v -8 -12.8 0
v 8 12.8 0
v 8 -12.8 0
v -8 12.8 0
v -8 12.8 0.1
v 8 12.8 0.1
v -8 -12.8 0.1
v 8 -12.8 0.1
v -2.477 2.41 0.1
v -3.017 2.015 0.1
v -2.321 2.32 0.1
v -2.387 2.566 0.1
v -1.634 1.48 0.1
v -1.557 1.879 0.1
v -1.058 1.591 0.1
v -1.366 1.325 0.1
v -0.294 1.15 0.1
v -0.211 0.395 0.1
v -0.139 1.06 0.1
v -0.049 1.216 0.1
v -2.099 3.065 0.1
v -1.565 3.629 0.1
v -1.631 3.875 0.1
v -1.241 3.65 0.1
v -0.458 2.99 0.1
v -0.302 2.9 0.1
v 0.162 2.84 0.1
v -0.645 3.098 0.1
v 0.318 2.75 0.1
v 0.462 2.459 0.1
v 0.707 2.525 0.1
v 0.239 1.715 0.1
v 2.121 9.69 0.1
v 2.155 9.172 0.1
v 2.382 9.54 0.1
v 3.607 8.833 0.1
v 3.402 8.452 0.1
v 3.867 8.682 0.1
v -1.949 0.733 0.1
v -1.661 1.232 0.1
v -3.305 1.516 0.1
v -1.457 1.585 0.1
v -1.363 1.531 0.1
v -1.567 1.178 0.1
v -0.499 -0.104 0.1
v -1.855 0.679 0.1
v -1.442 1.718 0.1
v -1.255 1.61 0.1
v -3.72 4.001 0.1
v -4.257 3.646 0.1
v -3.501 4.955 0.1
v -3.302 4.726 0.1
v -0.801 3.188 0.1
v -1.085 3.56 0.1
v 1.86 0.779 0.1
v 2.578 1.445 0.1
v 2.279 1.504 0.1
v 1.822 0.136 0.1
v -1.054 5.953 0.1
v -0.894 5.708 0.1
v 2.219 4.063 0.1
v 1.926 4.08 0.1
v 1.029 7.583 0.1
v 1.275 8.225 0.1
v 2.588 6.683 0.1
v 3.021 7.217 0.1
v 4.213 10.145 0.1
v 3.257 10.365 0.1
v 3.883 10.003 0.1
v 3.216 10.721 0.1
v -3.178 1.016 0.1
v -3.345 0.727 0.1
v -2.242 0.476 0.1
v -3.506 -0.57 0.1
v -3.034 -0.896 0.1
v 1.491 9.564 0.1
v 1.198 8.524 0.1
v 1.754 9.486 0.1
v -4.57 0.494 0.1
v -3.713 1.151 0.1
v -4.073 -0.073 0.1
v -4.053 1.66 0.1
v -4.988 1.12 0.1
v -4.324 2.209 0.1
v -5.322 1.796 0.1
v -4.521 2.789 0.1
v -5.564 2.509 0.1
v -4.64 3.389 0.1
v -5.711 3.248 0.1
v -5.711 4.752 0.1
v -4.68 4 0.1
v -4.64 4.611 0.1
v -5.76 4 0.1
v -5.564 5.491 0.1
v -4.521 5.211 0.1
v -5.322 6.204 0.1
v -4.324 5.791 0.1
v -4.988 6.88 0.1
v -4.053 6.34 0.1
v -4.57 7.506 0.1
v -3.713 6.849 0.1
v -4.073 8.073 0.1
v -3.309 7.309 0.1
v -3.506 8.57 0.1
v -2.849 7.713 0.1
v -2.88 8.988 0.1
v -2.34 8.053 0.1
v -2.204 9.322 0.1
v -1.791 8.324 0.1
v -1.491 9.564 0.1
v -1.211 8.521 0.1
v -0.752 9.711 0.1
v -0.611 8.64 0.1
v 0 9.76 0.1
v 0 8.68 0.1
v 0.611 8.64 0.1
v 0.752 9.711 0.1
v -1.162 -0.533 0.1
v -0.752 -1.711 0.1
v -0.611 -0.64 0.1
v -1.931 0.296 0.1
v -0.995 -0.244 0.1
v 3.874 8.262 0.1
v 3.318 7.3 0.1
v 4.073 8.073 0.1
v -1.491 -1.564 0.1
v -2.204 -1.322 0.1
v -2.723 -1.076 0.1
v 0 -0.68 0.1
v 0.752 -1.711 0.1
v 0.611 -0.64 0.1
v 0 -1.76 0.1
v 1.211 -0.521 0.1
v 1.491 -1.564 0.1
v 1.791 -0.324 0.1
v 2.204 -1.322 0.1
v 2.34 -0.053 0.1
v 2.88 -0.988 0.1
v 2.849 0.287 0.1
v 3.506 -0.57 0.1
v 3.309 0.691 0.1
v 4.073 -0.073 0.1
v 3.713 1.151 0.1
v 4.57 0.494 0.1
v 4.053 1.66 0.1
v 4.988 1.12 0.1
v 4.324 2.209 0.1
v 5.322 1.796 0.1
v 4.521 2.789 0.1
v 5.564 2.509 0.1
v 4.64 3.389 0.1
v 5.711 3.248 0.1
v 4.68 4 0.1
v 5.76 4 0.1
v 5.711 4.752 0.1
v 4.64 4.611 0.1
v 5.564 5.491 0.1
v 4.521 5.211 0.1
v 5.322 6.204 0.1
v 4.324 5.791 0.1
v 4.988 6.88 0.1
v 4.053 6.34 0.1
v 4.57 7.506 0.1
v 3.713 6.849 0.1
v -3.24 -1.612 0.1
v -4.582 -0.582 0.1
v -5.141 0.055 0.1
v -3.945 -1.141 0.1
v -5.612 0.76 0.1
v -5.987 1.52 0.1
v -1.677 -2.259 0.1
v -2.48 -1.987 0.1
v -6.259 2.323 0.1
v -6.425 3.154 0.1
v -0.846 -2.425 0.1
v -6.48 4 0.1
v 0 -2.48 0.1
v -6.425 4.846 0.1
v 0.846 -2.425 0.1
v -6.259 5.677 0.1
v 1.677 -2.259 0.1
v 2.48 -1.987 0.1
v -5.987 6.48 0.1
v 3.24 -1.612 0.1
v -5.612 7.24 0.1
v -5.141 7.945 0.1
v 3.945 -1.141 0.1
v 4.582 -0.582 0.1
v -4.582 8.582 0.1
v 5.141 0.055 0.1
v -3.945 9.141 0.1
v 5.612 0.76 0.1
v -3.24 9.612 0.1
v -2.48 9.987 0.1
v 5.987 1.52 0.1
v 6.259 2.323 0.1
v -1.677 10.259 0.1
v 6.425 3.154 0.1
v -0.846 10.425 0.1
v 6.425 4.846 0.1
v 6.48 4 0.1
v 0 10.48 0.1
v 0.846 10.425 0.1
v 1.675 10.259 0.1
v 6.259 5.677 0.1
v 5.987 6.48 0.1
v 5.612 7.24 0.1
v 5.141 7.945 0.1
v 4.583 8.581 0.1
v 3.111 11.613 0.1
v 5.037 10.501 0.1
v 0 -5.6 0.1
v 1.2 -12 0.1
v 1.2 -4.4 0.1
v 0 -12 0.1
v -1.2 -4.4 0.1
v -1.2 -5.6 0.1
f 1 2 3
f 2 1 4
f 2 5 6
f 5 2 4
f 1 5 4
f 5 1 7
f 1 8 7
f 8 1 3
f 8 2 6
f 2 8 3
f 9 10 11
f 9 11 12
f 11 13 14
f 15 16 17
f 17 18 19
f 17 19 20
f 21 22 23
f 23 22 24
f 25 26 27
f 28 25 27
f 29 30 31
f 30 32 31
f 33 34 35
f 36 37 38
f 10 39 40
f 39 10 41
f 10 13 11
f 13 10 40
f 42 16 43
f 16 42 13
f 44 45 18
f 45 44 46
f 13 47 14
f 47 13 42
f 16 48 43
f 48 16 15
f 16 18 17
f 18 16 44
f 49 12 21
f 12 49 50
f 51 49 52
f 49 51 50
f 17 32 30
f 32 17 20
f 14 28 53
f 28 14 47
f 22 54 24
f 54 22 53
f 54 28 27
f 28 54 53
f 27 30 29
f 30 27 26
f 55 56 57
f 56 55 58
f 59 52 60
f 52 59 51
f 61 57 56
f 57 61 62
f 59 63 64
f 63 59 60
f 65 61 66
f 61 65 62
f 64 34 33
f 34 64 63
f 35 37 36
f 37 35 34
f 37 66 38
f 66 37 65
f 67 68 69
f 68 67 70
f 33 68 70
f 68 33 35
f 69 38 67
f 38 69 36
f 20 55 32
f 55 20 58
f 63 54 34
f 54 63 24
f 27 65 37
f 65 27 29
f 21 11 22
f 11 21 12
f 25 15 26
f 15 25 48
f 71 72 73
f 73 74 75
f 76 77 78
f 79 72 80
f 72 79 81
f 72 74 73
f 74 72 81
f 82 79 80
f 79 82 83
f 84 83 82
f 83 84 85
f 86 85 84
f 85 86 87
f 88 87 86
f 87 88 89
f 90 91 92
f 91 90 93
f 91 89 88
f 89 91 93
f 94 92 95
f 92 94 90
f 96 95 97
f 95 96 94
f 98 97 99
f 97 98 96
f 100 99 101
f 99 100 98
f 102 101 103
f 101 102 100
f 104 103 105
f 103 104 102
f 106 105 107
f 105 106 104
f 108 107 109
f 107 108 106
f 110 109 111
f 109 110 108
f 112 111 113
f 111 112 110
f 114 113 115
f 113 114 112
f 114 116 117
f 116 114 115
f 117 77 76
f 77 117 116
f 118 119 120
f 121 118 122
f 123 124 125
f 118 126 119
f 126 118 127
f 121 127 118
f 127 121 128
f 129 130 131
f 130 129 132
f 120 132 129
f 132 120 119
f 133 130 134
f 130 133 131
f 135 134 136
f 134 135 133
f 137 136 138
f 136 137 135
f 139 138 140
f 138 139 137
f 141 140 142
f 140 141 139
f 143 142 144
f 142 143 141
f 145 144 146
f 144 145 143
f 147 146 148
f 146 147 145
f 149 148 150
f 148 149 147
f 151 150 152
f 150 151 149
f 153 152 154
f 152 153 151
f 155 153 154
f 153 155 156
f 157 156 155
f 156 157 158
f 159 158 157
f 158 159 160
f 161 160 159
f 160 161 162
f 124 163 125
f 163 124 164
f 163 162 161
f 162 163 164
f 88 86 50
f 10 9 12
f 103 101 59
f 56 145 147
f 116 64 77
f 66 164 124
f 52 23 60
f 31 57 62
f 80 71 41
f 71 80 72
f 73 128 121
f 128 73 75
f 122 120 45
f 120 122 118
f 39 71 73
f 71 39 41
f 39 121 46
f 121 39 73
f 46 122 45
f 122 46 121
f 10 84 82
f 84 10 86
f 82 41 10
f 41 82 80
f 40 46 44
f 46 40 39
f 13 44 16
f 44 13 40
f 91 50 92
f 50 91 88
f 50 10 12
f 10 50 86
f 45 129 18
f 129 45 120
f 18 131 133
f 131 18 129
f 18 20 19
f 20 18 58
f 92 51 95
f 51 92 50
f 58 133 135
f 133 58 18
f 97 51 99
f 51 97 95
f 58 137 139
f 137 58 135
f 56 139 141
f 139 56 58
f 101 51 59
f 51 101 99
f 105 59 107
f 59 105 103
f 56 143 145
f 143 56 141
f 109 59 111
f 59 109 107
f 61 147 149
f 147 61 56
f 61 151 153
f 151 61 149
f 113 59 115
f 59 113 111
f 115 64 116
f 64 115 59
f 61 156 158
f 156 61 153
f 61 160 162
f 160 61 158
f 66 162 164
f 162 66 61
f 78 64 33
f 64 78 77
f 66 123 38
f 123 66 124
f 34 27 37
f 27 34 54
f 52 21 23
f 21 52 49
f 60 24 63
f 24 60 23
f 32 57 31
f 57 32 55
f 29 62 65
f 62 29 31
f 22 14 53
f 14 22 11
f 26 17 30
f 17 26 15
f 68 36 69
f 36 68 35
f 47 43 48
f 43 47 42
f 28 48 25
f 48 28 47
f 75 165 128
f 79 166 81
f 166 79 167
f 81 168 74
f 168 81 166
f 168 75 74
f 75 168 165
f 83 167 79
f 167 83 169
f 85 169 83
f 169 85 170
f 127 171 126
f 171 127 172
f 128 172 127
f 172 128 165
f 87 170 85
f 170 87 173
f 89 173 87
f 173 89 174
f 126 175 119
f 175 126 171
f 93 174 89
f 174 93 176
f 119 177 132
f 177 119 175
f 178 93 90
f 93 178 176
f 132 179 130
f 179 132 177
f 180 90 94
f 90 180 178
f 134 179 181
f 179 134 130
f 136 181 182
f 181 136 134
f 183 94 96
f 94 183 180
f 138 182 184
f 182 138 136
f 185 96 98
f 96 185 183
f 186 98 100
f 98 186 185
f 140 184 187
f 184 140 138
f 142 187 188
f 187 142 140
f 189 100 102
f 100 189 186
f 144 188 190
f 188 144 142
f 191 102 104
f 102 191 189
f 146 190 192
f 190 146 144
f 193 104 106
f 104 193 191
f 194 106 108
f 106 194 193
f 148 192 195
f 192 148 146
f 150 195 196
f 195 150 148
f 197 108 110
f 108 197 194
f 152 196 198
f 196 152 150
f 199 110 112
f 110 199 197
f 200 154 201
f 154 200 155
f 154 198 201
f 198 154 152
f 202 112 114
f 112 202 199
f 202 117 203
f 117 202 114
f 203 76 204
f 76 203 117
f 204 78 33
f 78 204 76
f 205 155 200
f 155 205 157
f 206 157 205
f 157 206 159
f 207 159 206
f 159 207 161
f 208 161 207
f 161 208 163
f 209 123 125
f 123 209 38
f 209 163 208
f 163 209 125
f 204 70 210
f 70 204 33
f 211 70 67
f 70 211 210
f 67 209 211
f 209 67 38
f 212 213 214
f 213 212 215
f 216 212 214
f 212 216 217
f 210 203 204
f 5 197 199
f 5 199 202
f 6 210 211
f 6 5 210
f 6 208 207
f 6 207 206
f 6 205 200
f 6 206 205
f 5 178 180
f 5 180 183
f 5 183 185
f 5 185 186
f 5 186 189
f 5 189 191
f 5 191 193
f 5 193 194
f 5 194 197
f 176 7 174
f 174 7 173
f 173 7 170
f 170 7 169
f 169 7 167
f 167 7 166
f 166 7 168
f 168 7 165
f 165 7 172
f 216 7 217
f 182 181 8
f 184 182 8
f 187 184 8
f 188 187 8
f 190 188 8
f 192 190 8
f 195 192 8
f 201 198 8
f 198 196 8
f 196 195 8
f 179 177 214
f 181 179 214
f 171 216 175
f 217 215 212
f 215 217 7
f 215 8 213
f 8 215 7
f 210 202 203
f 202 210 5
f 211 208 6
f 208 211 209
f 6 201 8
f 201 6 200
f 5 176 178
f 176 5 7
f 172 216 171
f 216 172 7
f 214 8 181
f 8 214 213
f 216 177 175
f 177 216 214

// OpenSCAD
// file: ../p/logo-launchcommand-bg.scad
use <../lib.scad>
function ldraw_lib__logo_launchcommand_bg() = [
// 0 Launch Command Logo Background (without Border)
// 0 Name: logo-launchcommand-bg.dat
// 0 Author: Chris Böhnke [KnightOfTarenta]
// 0 !LDRAW_ORG Primitive UPDATE 2025-05
// 0 !LICENSE Licensed under CC BY 4.0 : see CAreadme.txt
// 
// 0 !HELP Dimensions X = 32; Z = 34.67
// 
// 0 BFC CERTIFY CCW
  [0,"BFC","CERTIFY"],
  [0,"BFC","CCW"],
// 
// 0 !HISTORY 2025-04-27 [OrionP] Official Update 2025-04
// 0 !HISTORY 2025-05-24 [Holly-Wood] Updated description
// 0 !HISTORY 2025-05-28 [OrionP] Official Update 2025-05
// 
// 0 // Colour 16 Main Colour
// 3 16 -12.889 0 -1.697 -12.557 0 -3.365 -11.826 0 -.984
  [3,16,-12.889,0,-1.697,-12.557,0,-3.365,-11.826,0,-.984],
// 3 16 -8.38 0 -5.514 -6.88 0 -4.417 -6.63 0 -3.984
  [3,16,-8.38,0,-5.514,-6.88,0,-4.417,-6.63,0,-3.984],
// 3 16 -9.192 0 9.192 -10.314 0 7.914 -2.929 0 5.426
  [3,16,-9.192,0,9.192,-10.314,0,7.914,-2.929,0,5.426],
// 3 16 7.161 0 -7.097 11.258 0 -6.5 12.01 0 -4.975
  [3,16,7.161,0,-7.097,11.258,0,-6.5,12.01,0,-4.975],
// 3 16 1.697 0 12.889 3.542 0 11.736 3.329 0 12.566
  [3,16,1.697,0,12.889,3.542,0,11.736,3.329,0,12.566],
// 3 16 8.392 0 8.936 10.314 0 7.914 9.218 0 9.166
  [3,16,8.392,0,8.936,10.314,0,7.914,9.218,0,9.166],
// 3 16 -9.171 0 2.016 -4.53 0 -.347 -2.483 0 4.744
  [3,16,-9.171,0,2.016,-4.53,0,-.347,-2.483,0,4.744],
// 3 16 1.965 0 -4.097 6.331 0 -6.934 5.35 0 .222
  [3,16,1.965,0,-4.097,6.331,0,-6.934,5.35,0,.222],
// 4 16 -9.18 0 -6.9 -10.314 0 -7.914 -9.291 0 -9.093 -8.827 0 -8.289
  [4,16,-9.18,0,-6.9,-10.314,0,-7.914,-9.291,0,-9.093,-8.827,0,-8.289],
// 4 16 -7.563 0 -14.1 -5.363 0 -10.289 -6.229 0 -9.789 -8.429 0 -13.6
  [4,16,-7.563,0,-14.1,-5.363,0,-10.289,-6.229,0,-9.789,-8.429,0,-13.6],
// 4 16 -1.386 0 -11.4 -2.765 0 -11.789 -3.229 0 -12.593 -1.697 0 -12.889
  [4,16,-1.386,0,-11.4,-2.765,0,-11.789,-3.229,0,-12.593,-1.697,0,-12.889],
// 4 16 -9.18 0 -6.9 -8.827 0 -8.289 -6.229 0 -9.789 -5.413 0 -9.075
  [4,16,-9.18,0,-6.9,-8.827,0,-8.289,-6.229,0,-9.789,-5.413,0,-9.075],
// 4 16 -5.413 0 -9.075 -6.229 0 -9.789 -5.363 0 -10.289 -5.153 0 -9.225
  [4,16,-5.413,0,-9.075,-6.229,0,-9.789,-5.363,0,-10.289,-5.153,0,-9.225],
// 4 16 -1.386 0 -11.4 -5.153 0 -9.225 -5.363 0 -10.289 -2.765 0 -11.789
  [4,16,-1.386,0,-11.4,-5.153,0,-9.225,-5.363,0,-10.289,-2.765,0,-11.789],
// 4 16 -12.557 0 -3.365 -12.01 0 -4.975 -11.258 0 -6.5 -8.38 0 -5.514
  [4,16,-12.557,0,-3.365,-12.01,0,-4.975,-11.258,0,-6.5,-8.38,0,-5.514],
// 4 16 -10.314 0 -7.914 -9.18 0 -6.9 -8.38 0 -5.514 -11.258 0 -6.5
  [4,16,-10.314,0,-7.914,-9.18,0,-6.9,-8.38,0,-5.514,-11.258,0,-6.5],
// 4 16 -4.613 0 -7.689 -5.413 0 -9.075 -5.153 0 -9.225 -4.353 0 -7.839
  [4,16,-4.613,0,-7.689,-5.413,0,-9.075,-5.153,0,-9.225,-4.353,0,-7.839],
// 4 16 -3.794 0 -7.431 -4.538 0 -7.001 -4.613 0 -7.689 -4.353 0 -7.839
  [4,16,-3.794,0,-7.431,-4.538,0,-7.001,-4.613,0,-7.689,-4.353,0,-7.839],
// 4 16 -12.889 0 -1.697 -11.826 0 -.984 -12.889 0 1.697 -13 0 0
  [4,16,-12.889,0,-1.697,-11.826,0,-.984,-12.889,0,1.697,-13,0,0],
// 4 16 -12.557 0 -3.365 -8.38 0 -5.514 -6.63 0 -3.984 -11.826 0 -.984
  [4,16,-12.557,0,-3.365,-8.38,0,-5.514,-6.63,0,-3.984,-11.826,0,-.984],
// 4 16 -1.697 0 -12.889 0 0 -13 -.586 0 -10.014 -1.386 0 -11.4
  [4,16,-1.697,0,-12.889,0,0,-13,-.586,0,-10.014,-1.386,0,-11.4],
// 4 16 0 0 -13 1.697 0 -12.889 3.365 0 -12.557 -.586 0 -10.014
  [4,16,0,0,-13,1.697,0,-12.889,3.365,0,-12.557,-.586,0,-10.014],
// 4 16 5.061 0 -10.734 -.135 0 -7.734 -.385 0 -8.167 -.586 0 -10.014
  [4,16,5.061,0,-10.734,-.135,0,-7.734,-.385,0,-8.167,-.586,0,-10.014],
// 4 16 -11.826 0 -.984 -9.726 0 2.653 -12.557 0 3.365 -12.889 0 1.697
  [4,16,-11.826,0,-.984,-9.726,0,2.653,-12.557,0,3.365,-12.889,0,1.697],
// 4 16 -.586 0 -10.014 3.365 0 -12.557 4.975 0 -12.01 5.061 0 -10.734
  [4,16,-.586,0,-10.014,3.365,0,-12.557,4.975,0,-12.01,5.061,0,-10.734],
// 4 16 -12.557 0 3.365 -9.726 0 2.653 -11.258 0 6.5 -12.01 0 4.975
  [4,16,-12.557,0,3.365,-9.726,0,2.653,-11.258,0,6.5,-12.01,0,4.975],
// 4 16 4.975 0 -12.01 6.5 0 -11.258 7.914 0 -10.314 5.061 0 -10.734
  [4,16,4.975,0,-12.01,6.5,0,-11.258,7.914,0,-10.314,5.061,0,-10.734],
// 4 16 5.061 0 -10.734 7.914 0 -10.314 9.192 0 -9.192 7.161 0 -7.097
  [4,16,5.061,0,-10.734,7.914,0,-10.314,9.192,0,-9.192,7.161,0,-7.097],
// 4 16 -11.258 0 6.5 -9.726 0 2.653 -2.929 0 5.426 -10.314 0 7.914
  [4,16,-11.258,0,6.5,-9.726,0,2.653,-2.929,0,5.426,-10.314,0,7.914],
// 4 16 -6.5 0 11.258 -7.914 0 10.314 -9.192 0 9.192 -2.929 0 5.426
  [4,16,-6.5,0,11.258,-7.914,0,10.314,-9.192,0,9.192,-2.929,0,5.426],
// 4 16 9.192 0 -9.192 10.314 0 -7.914 11.258 0 -6.5 7.161 0 -7.097
  [4,16,9.192,0,-9.192,10.314,0,-7.914,11.258,0,-6.5,7.161,0,-7.097],
// 4 16 -3.365 0 12.557 -4.975 0 12.01 -6.5 0 11.258 -2.929 0 5.426
  [4,16,-3.365,0,12.557,-4.975,0,12.01,-6.5,0,11.258,-2.929,0,5.426],
// 4 16 7.161 0 -7.097 12.01 0 -4.975 12.557 0 -3.365 6.164 0 .176
  [4,16,7.161,0,-7.097,12.01,0,-4.975,12.557,0,-3.365,6.164,0,.176],
// 4 16 12.557 0 -3.365 12.889 0 -1.697 13 0 0 6.164 0 .176
  [4,16,12.557,0,-3.365,12.889,0,-1.697,13,0,0,6.164,0,.176],
// 4 16 -3.365 0 12.557 -2.929 0 5.426 0 0 13 -1.697 0 12.889
  [4,16,-3.365,0,12.557,-2.929,0,5.426,0,0,13,-1.697,0,12.889],
// 4 16 -2.929 0 5.426 3.542 0 11.736 1.697 0 12.889 0 0 13
  [4,16,-2.929,0,5.426,3.542,0,11.736,1.697,0,12.889,0,0,13],
// 4 16 13 0 0 12.889 0 1.697 12.557 0 3.365 6.164 0 .176
  [4,16,13,0,0,12.889,0,1.697,12.557,0,3.365,6.164,0,.176],
// 4 16 11.258 0 6.5 6.164 0 .176 12.557 0 3.365 12.01 0 4.975
  [4,16,11.258,0,6.5,6.164,0,.176,12.557,0,3.365,12.01,0,4.975],
// 4 16 10.314 0 7.914 8.392 0 8.936 6.164 0 .176 11.258 0 6.5
  [4,16,10.314,0,7.914,8.392,0,8.936,6.164,0,.176,11.258,0,6.5],
// 4 16 5.892 0 15.806 4.873 0 15.24 3.329 0 12.566 3.542 0 11.736
  [4,16,5.892,0,15.806,4.873,0,15.24,3.329,0,12.566,3.542,0,11.736],
// 4 16 10.742 0 13.006 8.392 0 8.936 9.218 0 9.166 10.762 0 11.84
  [4,16,10.742,0,13.006,8.392,0,8.936,9.218,0,9.166,10.762,0,11.84],
// 4 16 .449 0 -3.222 9.449 0 12.367 5.985 0 14.367 -3.015 0 -1.222
  [4,16,.449,0,-3.222,9.449,0,12.367,5.985,0,14.367,-3.015,0,-1.222],
// 4 16 -10.334 0 .002 -5.83 0 -2.598 -4.53 0 -.347 -9.171 0 2.016
  [4,16,-10.334,0,.002,-5.83,0,-2.598,-4.53,0,-.347,-9.171,0,2.016],
// 4 16 2.859 0 9.952 -2.483 0 4.744 -4.53 0 -.347 -3.448 0 -.972
  [4,16,2.859,0,9.952,-2.483,0,4.744,-4.53,0,-.347,-3.448,0,-.972],
// 4 16 1.965 0 -4.097 .665 0 -6.348 5.168 0 -8.948 6.331 0 -6.934
  [4,16,1.965,0,-4.097,.665,0,-6.348,5.168,0,-8.948,6.331,0,-6.934],
// 4 16 7.189 0 7.452 .882 0 -3.472 1.965 0 -4.097 5.35 0 .222
  [4,16,7.189,0,7.452,.882,0,-3.472,1.965,0,-4.097,5.35,0,.222],
// 4 16 -6.447 0 -4.667 -4.326 0 -5.892 -2.226 0 -2.255 -4.347 0 -1.03
  [4,16,-6.447,0,-4.667,-4.326,0,-5.892,-2.226,0,-2.255,-4.347,0,-1.03],
// 4 16 -.818 0 -7.917 1.282 0 -4.28 -.84 0 -3.055 -2.94 0 -6.692
  [4,16,-.818,0,-7.917,1.282,0,-4.28,-.84,0,-3.055,-2.94,0,-6.692],
// 4 16 10.019 0 13.424 10.787 0 16.675 9.047 0 17.68 6.616 0 15.388
  [4,16,10.019,0,13.424,10.787,0,16.675,9.047,0,17.68,6.616,0,15.388],
// 4 16 -4.046 0 -6.708 -3.786 0 -6.858 -3.486 0 -6.638 -4.006 0 -6.338
  [4,16,-4.046,0,-6.708,-3.786,0,-6.858,-3.486,0,-6.638,-4.006,0,-6.338],
// 4 16 -3.486 0 -6.638 -1.273 0 -2.805 -1.793 0 -2.505 -4.006 0 -6.338
  [4,16,-3.486,0,-6.638,-1.273,0,-2.805,-1.793,0,-2.505,-4.006,0,-6.338],
];
module ldraw_lib__logo_launchcommand_bg(step=0, col=false, unit=2/5, alt=false, line=0.2, solid=!$preview)
    makepoly(ldraw_lib__logo_launchcommand_bg(), step=step, col=col, unit=unit, alt=alt, line=line, solid=solid);
ldraw_lib__logo_launchcommand_bg(line=0.2);
// file: s/3068bp11s01.scad
use <../../lib.scad>
use <../../p/logo-launchcommand-bg.scad>
use <../../p/logo-launchcommand.scad>
function ldraw_lib__s__3068bp11s01() = [
// 0 ~Launch Command Logo Pattern (without Border)
// 0 Name: s\3068bp11s01.dat
// 0 Author: Chris Böhnke [KnightOfTarenta]
// 0 !LDRAW_ORG Subpart UPDATE 2026-02
// 0 !LICENSE Licensed under CC BY 4.0 : see CAreadme.txt
// 
// 0 !HELP Dimensions X = 32; Z = 34.67
// 
// 0 BFC CERTIFY CCW
  [0,"BFC","CERTIFY"],
  [0,"BFC","CCW"],
// 
// 0 !HISTORY 2025-03-30 [OrionP] Official Update 2025-03
// 0 !HISTORY 2025-04-04 [KnightOfTarenta] Sub-filed
// 0 !HISTORY 2026-03-06 [OrionP] Official Update 2026-02
// 
// 1 16 0 0 0 1 0 0 0 1 0 0 0 1 logo-launchcommand.dat
  [1,16,0,0,0,1,0,0,0,1,0,0,0,1, ldraw_lib__logo_launchcommand()],
// 1 16 0 0 0 1 0 0 0 1 0 0 0 1 logo-launchcommand-bg.dat
  [1,16,0,0,0,1,0,0,0,1,0,0,0,1, ldraw_lib__logo_launchcommand_bg()],
];
module ldraw_lib__s__3068bp11s01(step=0, col=false, unit=2/5, alt=false, line=0.2, solid=!$preview)
    makepoly(ldraw_lib__s__3068bp11s01(), step=step, col=col, unit=unit, alt=alt, line=line, solid=solid);
ldraw_lib__s__3068bp11s01(line=0.2);
// file: s/169665es01.scad
use <../../lib.scad>
function ldraw_lib__s__169665es01() = [
// 0 ~Outline for Launch Command Logo
// 0 Name: s\169665es01.dat
// 0 Author: Chris Böhnke [KnightOfTarenta]
// 0 !LDRAW_ORG Subpart UPDATE 2026-02
// 0 !LICENSE Licensed under CC BY 4.0 : see CAreadme.txt
// 
// 0 BFC CERTIFY CCW
  [0,"BFC","CERTIFY"],
  [0,"BFC","CCW"],
// 
// 0 !HISTORY 2026-03-06 [OrionP] Official Update 2026-02
// 
// 3 16 -8.429 0 -13.6 -9 0 -15.589 -7.563 0 -14.1
  [3,16,-8.429,0,-13.6,-9,0,-15.589,-7.563,0,-14.1],
// 4 16 -14.28 0 -10.958 -12.728 0 -12.728 -11.314 0 -11.314 -12.694 0 -9.74
  [4,16,-14.28,0,-10.958,-12.728,0,-12.728,-11.314,0,-11.314,-12.694,0,-9.74],
// 4 16 -12.728 0 -12.728 -10.958 0 -14.28 -9.74 0 -12.694 -11.314 0 -11.314
  [4,16,-12.728,0,-12.728,-10.958,0,-14.28,-9.74,0,-12.694,-11.314,0,-11.314],
// 4 16 -9 0 -15.589 -8.429 0 -13.6 -9.74 0 -12.694 -10.958 0 -14.28
  [4,16,-9,0,-15.589,-8.429,0,-13.6,-9.74,0,-12.694,-10.958,0,-14.28],
// 4 16 -12.694 0 -9.74 -13.856 0 -8 -15.588 0 -9 -14.28 0 -10.958
  [4,16,-12.694,0,-9.74,-13.856,0,-8,-15.588,0,-9,-14.28,0,-10.958],
// 4 16 -13.856 0 -8 -14.782 0 -6.123 -16.63 0 -6.888 -15.588 0 -9
  [4,16,-13.856,0,-8,-14.782,0,-6.123,-16.63,0,-6.888,-15.588,0,-9],
// 4 16 -4.141 0 -15.455 -6.123 0 -14.782 -6.888 0 -16.63 -4.659 0 -17.387
  [4,16,-4.141,0,-15.455,-6.123,0,-14.782,-6.888,0,-16.63,-4.659,0,-17.387],
// 4 16 -9 0 -15.589 -6.888 0 -16.63 -6.123 0 -14.782 -7.563 0 -14.1
  [4,16,-9,0,-15.589,-6.888,0,-16.63,-6.123,0,-14.782,-7.563,0,-14.1],
// 4 16 -14.782 0 -6.123 -15.455 0 -4.141 -17.387 0 -4.659 -16.63 0 -6.888
  [4,16,-14.782,0,-6.123,-15.455,0,-4.141,-17.387,0,-4.659,-16.63,0,-6.888],
// 4 16 -15.455 0 -4.141 -15.863 0 -2.088 -17.846 0 -2.35 -17.387 0 -4.659
  [4,16,-15.455,0,-4.141,-15.863,0,-2.088,-17.846,0,-2.35,-17.387,0,-4.659],
// 4 16 -4.659 0 -17.387 -2.349 0 -17.846 -2.088 0 -15.863 -4.141 0 -15.455
  [4,16,-4.659,0,-17.387,-2.349,0,-17.846,-2.088,0,-15.863,-4.141,0,-15.455],
// 4 16 -15.863 0 -2.088 -16 0 0 -18 0 0 -17.846 0 -2.35
  [4,16,-15.863,0,-2.088,-16,0,0,-18,0,0,-17.846,0,-2.35],
// 4 16 -2.349 0 -17.846 0 0 -18 0 0 -16 -2.088 0 -15.863
  [4,16,-2.349,0,-17.846,0,0,-18,0,0,-16,-2.088,0,-15.863],
// 4 16 -16 0 0 -15.863 0 2.088 -17.846 0 2.349 -18 0 0
  [4,16,-16,0,0,-15.863,0,2.088,-17.846,0,2.349,-18,0,0],
// 4 16 0 0 -18 2.349 0 -17.846 2.088 0 -15.863 0 0 -16
  [4,16,0,0,-18,2.349,0,-17.846,2.088,0,-15.863,0,0,-16],
// 4 16 -15.863 0 2.088 -15.455 0 4.141 -17.387 0 4.659 -17.846 0 2.349
  [4,16,-15.863,0,2.088,-15.455,0,4.141,-17.387,0,4.659,-17.846,0,2.349],
// 4 16 2.349 0 -17.846 4.659 0 -17.387 4.141 0 -15.455 2.088 0 -15.863
  [4,16,2.349,0,-17.846,4.659,0,-17.387,4.141,0,-15.455,2.088,0,-15.863],
// 4 16 6.123 0 -14.782 4.141 0 -15.455 4.659 0 -17.387 6.888 0 -16.63
  [4,16,6.123,0,-14.782,4.141,0,-15.455,4.659,0,-17.387,6.888,0,-16.63],
// 4 16 -15.455 0 4.141 -14.782 0 6.123 -16.63 0 6.888 -17.387 0 4.659
  [4,16,-15.455,0,4.141,-14.782,0,6.123,-16.63,0,6.888,-17.387,0,4.659],
// 4 16 8 0 -13.856 6.123 0 -14.782 6.888 0 -16.63 9 0 -15.589
  [4,16,8,0,-13.856,6.123,0,-14.782,6.888,0,-16.63,9,0,-15.589],
// 4 16 -14.782 0 6.123 -13.856 0 8 -15.588 0 9 -16.63 0 6.888
  [4,16,-14.782,0,6.123,-13.856,0,8,-15.588,0,9,-16.63,0,6.888],
// 4 16 -13.856 0 8 -12.694 0 9.74 -14.28 0 10.958 -15.588 0 9
  [4,16,-13.856,0,8,-12.694,0,9.74,-14.28,0,10.958,-15.588,0,9],
// 4 16 8 0 -13.856 9 0 -15.589 10.958 0 -14.28 9.74 0 -12.694
  [4,16,8,0,-13.856,9,0,-15.589,10.958,0,-14.28,9.74,0,-12.694],
// 4 16 10.958 0 -14.28 12.728 0 -12.728 11.314 0 -11.314 9.74 0 -12.694
  [4,16,10.958,0,-14.28,12.728,0,-12.728,11.314,0,-11.314,9.74,0,-12.694],
// 4 16 -12.694 0 9.74 -11.314 0 11.314 -12.728 0 12.728 -14.28 0 10.958
  [4,16,-12.694,0,9.74,-11.314,0,11.314,-12.728,0,12.728,-14.28,0,10.958],
// 4 16 14.28 0 -10.958 12.694 0 -9.74 11.314 0 -11.314 12.728 0 -12.728
  [4,16,14.28,0,-10.958,12.694,0,-9.74,11.314,0,-11.314,12.728,0,-12.728],
// 4 16 -11.314 0 11.314 -9.74 0 12.694 -10.958 0 14.28 -12.728 0 12.728
  [4,16,-11.314,0,11.314,-9.74,0,12.694,-10.958,0,14.28,-12.728,0,12.728],
// 4 16 12.694 0 -9.74 14.28 0 -10.958 15.588 0 -9 13.856 0 -8
  [4,16,12.694,0,-9.74,14.28,0,-10.958,15.588,0,-9,13.856,0,-8],
// 4 16 -9.74 0 12.694 -8 0 13.856 -9 0 15.588 -10.958 0 14.28
  [4,16,-9.74,0,12.694,-8,0,13.856,-9,0,15.588,-10.958,0,14.28],
// 4 16 -6.888 0 16.63 -9 0 15.588 -8 0 13.856 -6.123 0 14.782
  [4,16,-6.888,0,16.63,-9,0,15.588,-8,0,13.856,-6.123,0,14.782],
// 4 16 15.588 0 -9 16.63 0 -6.888 14.782 0 -6.123 13.856 0 -8
  [4,16,15.588,0,-9,16.63,0,-6.888,14.782,0,-6.123,13.856,0,-8],
// 4 16 17.387 0 -4.659 15.455 0 -4.141 14.782 0 -6.123 16.63 0 -6.888
  [4,16,17.387,0,-4.659,15.455,0,-4.141,14.782,0,-6.123,16.63,0,-6.888],
// 4 16 -4.141 0 15.455 -4.659 0 17.387 -6.888 0 16.63 -6.123 0 14.782
  [4,16,-4.141,0,15.455,-4.659,0,17.387,-6.888,0,16.63,-6.123,0,14.782],
// 4 16 17.387 0 -4.659 17.846 0 -2.35 15.863 0 -2.088 15.455 0 -4.141
  [4,16,17.387,0,-4.659,17.846,0,-2.35,15.863,0,-2.088,15.455,0,-4.141],
// 4 16 -2.088 0 15.863 -2.349 0 17.846 -4.659 0 17.387 -4.141 0 15.455
  [4,16,-2.088,0,15.863,-2.349,0,17.846,-4.659,0,17.387,-4.141,0,15.455],
// 4 16 17.846 0 2.349 15.863 0 2.088 16 0 0 18 0 0
  [4,16,17.846,0,2.349,15.863,0,2.088,16,0,0,18,0,0],
// 4 16 17.846 0 -2.35 18 0 0 16 0 0 15.863 0 -2.088
  [4,16,17.846,0,-2.35,18,0,0,16,0,0,15.863,0,-2.088],
// 4 16 -2.088 0 15.863 0 0 16 0 0 18 -2.349 0 17.846
  [4,16,-2.088,0,15.863,0,0,16,0,0,18,-2.349,0,17.846],
// 4 16 2.088 0 15.863 2.349 0 17.846 0 0 18 0 0 16
  [4,16,2.088,0,15.863,2.349,0,17.846,0,0,18,0,0,16],
// 4 16 2.349 0 17.846 2.088 0 15.863 4.141 0 15.455 4.654 0 17.387
  [4,16,2.349,0,17.846,2.088,0,15.863,4.141,0,15.455,4.654,0,17.387],
// 4 16 5.892 0 15.806 4.654 0 17.387 4.141 0 15.455 4.873 0 15.24
  [4,16,5.892,0,15.806,4.654,0,17.387,4.141,0,15.455,4.873,0,15.24],
// 4 16 15.455 0 4.141 15.863 0 2.088 17.846 0 2.349 17.387 0 4.659
  [4,16,15.455,0,4.141,15.863,0,2.088,17.846,0,2.349,17.387,0,4.659],
// 4 16 15.455 0 4.141 17.387 0 4.659 16.63 0 6.888 14.782 0 6.123
  [4,16,15.455,0,4.141,17.387,0,4.659,16.63,0,6.888,14.782,0,6.123],
// 4 16 16.63 0 6.888 15.588 0 9 13.856 0 8 14.782 0 6.123
  [4,16,16.63,0,6.888,15.588,0,9,13.856,0,8,14.782,0,6.123],
// 4 16 15.588 0 9 14.28 0 10.958 12.694 0 9.74 13.856 0 8
  [4,16,15.588,0,9,14.28,0,10.958,12.694,0,9.74,13.856,0,8],
// 4 16 10.742 0 13.006 10.762 0 11.84 11.314 0 11.314 12.731 0 12.725
  [4,16,10.742,0,13.006,10.762,0,11.84,11.314,0,11.314,12.731,0,12.725],
// 4 16 14.28 0 10.958 12.731 0 12.725 11.314 0 11.314 12.694 0 9.74
  [4,16,14.28,0,10.958,12.731,0,12.725,11.314,0,11.314,12.694,0,9.74],
// 4 16 5.892 0 15.806 8.932 0 18.67 8.643 0 21.146 4.654 0 17.387
  [4,16,5.892,0,15.806,8.932,0,18.67,8.643,0,21.146,4.654,0,17.387],
// 4 16 8.643 0 21.146 8.932 0 18.67 11.703 0 17.07 13.992 0 18.058
  [4,16,8.643,0,21.146,8.932,0,18.67,11.703,0,17.07,13.992,0,18.058],
// 4 16 10.742 0 13.006 12.731 0 12.725 13.992 0 18.058 11.703 0 17.07
  [4,16,10.742,0,13.006,12.731,0,12.725,13.992,0,18.058,11.703,0,17.07],
];
module ldraw_lib__s__169665es01(step=0, col=false, unit=2/5, alt=false, line=0.2, solid=!$preview)
    makepoly(ldraw_lib__s__169665es01(), step=step, col=col, unit=unit, alt=alt, line=line, solid=solid);
ldraw_lib__s__169665es01(line=0.2);
// file: ../p/box5-12.scad
use <../lib.scad>
function ldraw_lib__box5_12() = [
// 0 Box with 5 Faces without Any Edges
// 0 Name: box5-12.dat
// 0 Author: Chris Dee [cwdee]
// 0 !LDRAW_ORG Primitive UPDATE 2009-02
// 0 !LICENSE Licensed under CC BY 4.0 : see CAreadme.txt
// 
// 0 BFC CERTIFY CCW
  [0,"BFC","CERTIFY"],
  [0,"BFC","CCW"],
// 
// 0 !HISTORY 2009-09-03 [PTadmin] Official Update 2009-02
// 
// 
// 4 16 1 1 1 1 1 -1 -1 1 -1 -1 1 1
  [4,16,1,1,1,1,1,-1,-1,1,-1,-1,1,1],
// 4 16 -1 0 1 1 0 1 1 1 1 -1 1 1
  [4,16,-1,0,1,1,0,1,1,1,1,-1,1,1],
// 4 16 -1 0 -1 -1 0 1 -1 1 1 -1 1 -1
  [4,16,-1,0,-1,-1,0,1,-1,1,1,-1,1,-1],
// 4 16 1 0 -1 -1 0 -1 -1 1 -1 1 1 -1
  [4,16,1,0,-1,-1,0,-1,-1,1,-1,1,1,-1],
// 4 16 1 0 1 1 0 -1 1 1 -1 1 1 1
  [4,16,1,0,1,1,0,-1,1,1,-1,1,1,1],
// 0
];
module ldraw_lib__box5_12(step=0, col=false, unit=2/5, alt=false, line=0.2, solid=!$preview)
    makepoly(ldraw_lib__box5_12(), step=step, col=col, unit=unit, alt=alt, line=line, solid=solid);
ldraw_lib__box5_12(line=0.2);
// main file
use <../lib.scad>
use <../p/box5-12.scad>
use <s/169665es01.scad>
use <s/3068bp11s01.scad>
function ldraw_lib__169665e() = [
// 0 Sticker  2.0 x  3.2 with Launch Command Logo and Black Number "1"
// 0 Name: 169665e.dat
// 0 Author: Chris Böhnke [KnightOfTarenta]
// 0 !LDRAW_ORG Part UPDATE 2026-02
// 0 !LICENSE Licensed under CC BY 4.0 : see CAreadme.txt
// 
// 0 BFC CERTIFY CCW
  [0,"BFC","CERTIFY"],
  [0,"BFC","CCW"],
// 
// 0 !KEYWORDS Booster Rocket, Bricklink 6339stk01, Brickowl 588738, Launch Command
// 0 !KEYWORDS Rebrickable 169665, set 6339, Shuttle Launch Pad, space port, town
// 
// 0 !HISTORY 2026-03-06 [OrionP] Official Update 2026-02
// 
// 1 16 0 -0.25 0 20 0 0 0 0.25 0 0 0 32 box5-12.dat
  [1,16,0,-0.25,0,20,0,0,0,0.25,0,0,0,32, ldraw_lib__box5_12()],
// 0 BFC NOCLIP
  [0,"BFC","NOCLIP"],
// 0 // Logo
// 1 15 0 -.25 10 .9 0 0 0 1 0 0 0 .9 s\3068bp11s01.dat
  [1,15,0,-.25,10,.9,0,0,0,1,0,0,0,.9, ldraw_lib__s__3068bp11s01()],
// 1 15 0 -.25 10 .9 0 0 0 1 0 0 0 .9 s\169665es01.dat
  [1,15,0,-.25,10,.9,0,0,0,1,0,0,0,.9, ldraw_lib__s__169665es01()],
// 
// 0 // Colour 0 Black
// 4 0 0 -.25 -30 3 -.25 -30 3 -.25 -11 0 -.25 -14
  [4,0,0,-.25,-30,3,-.25,-30,3,-.25,-11,0,-.25,-14],
// 4 0 -3 -.25 -14 0 -.25 -14 3 -.25 -11 -3 -.25 -11
  [4,0,-3,-.25,-14,0,-.25,-14,3,-.25,-11,-3,-.25,-11],
// 
// 0 BFC CLIP
  [0,"BFC","CLIP"],
// 0 // Colour 16 Main Colour
// 3 16 7.7787 -.25 29.0314 2.1141 -.25 26.0614 4.1886 -.25 25.6483
  [3,16,7.7787,-.25,29.0314,2.1141,-.25,26.0614,4.1886,-.25,25.6483],
// 3 16 -20 -.25 32 -4.1931 -.25 25.6483 -2.1141 -.25 26.0614
  [3,16,-20,-.25,32,-4.1931,-.25,25.6483,-2.1141,-.25,26.0614],
// 3 16 -20 -.25 32 -2.1141 -.25 26.0614 0 -.25 26.2
  [3,16,-20,-.25,32,-2.1141,-.25,26.0614,0,-.25,26.2],
// 3 16 20 -.25 32 7.7787 -.25 29.0314 12.5928 -.25 26.2522
  [3,16,20,-.25,32,7.7787,-.25,29.0314,12.5928,-.25,26.2522],
// 3 16 20 -.25 32 -20 -.25 32 7.7787 -.25 29.0314
  [3,16,20,-.25,32,-20,-.25,32,7.7787,-.25,29.0314],
// 3 16 20 -.25 32 12.852 -.25 19.8622 14.0292 -.25 18.1
  [3,16,20,-.25,32,12.852,-.25,19.8622,14.0292,-.25,18.1],
// 3 16 20 -.25 32 14.0292 -.25 18.1 14.967 -.25 16.1992
  [3,16,20,-.25,32,14.0292,-.25,18.1,14.967,-.25,16.1992],
// 3 16 20 -.25 32 15.6483 -.25 14.1931 16.0614 -.25 12.1141
  [3,16,20,-.25,32,15.6483,-.25,14.1931,16.0614,-.25,12.1141],
// 3 16 20 -.25 32 14.967 -.25 16.1992 15.6483 -.25 14.1931
  [3,16,20,-.25,32,14.967,-.25,16.1992,15.6483,-.25,14.1931],
// 3 16 -20 -.25 32 -16.0614 -.25 12.1141 -15.6483 -.25 14.1931
  [3,16,-20,-.25,32,-16.0614,-.25,12.1141,-15.6483,-.25,14.1931],
// 3 16 -20 -.25 32 -15.6483 -.25 14.1931 -14.967 -.25 16.1992
  [3,16,-20,-.25,32,-15.6483,-.25,14.1931,-14.967,-.25,16.1992],
// 3 16 -20 -.25 32 -14.967 -.25 16.1992 -14.0292 -.25 18.1
  [3,16,-20,-.25,32,-14.967,-.25,16.1992,-14.0292,-.25,18.1],
// 3 16 -20 -.25 32 -14.0292 -.25 18.1 -12.852 -.25 19.8622
  [3,16,-20,-.25,32,-14.0292,-.25,18.1,-12.852,-.25,19.8622],
// 3 16 -20 -.25 32 -12.852 -.25 19.8622 -11.4552 -.25 21.4552
  [3,16,-20,-.25,32,-12.852,-.25,19.8622,-11.4552,-.25,21.4552],
// 3 16 -20 -.25 32 -11.4552 -.25 21.4552 -9.8622 -.25 22.852
  [3,16,-20,-.25,32,-11.4552,-.25,21.4552,-9.8622,-.25,22.852],
// 3 16 -20 -.25 32 -9.8622 -.25 22.852 -8.1 -.25 24.0292
  [3,16,-20,-.25,32,-9.8622,-.25,22.852,-8.1,-.25,24.0292],
// 3 16 -20 -.25 32 -8.1 -.25 24.0292 -6.1992 -.25 24.967
  [3,16,-20,-.25,32,-8.1,-.25,24.0292,-6.1992,-.25,24.967],
// 3 16 -20 -.25 32 -6.1992 -.25 24.967 -4.1931 -.25 25.6483
  [3,16,-20,-.25,32,-6.1992,-.25,24.967,-4.1931,-.25,25.6483],
// 3 16 -16.2 -.25 10 -20 -.25 -32 -16.0614 -.25 7.885
  [3,16,-16.2,-.25,10,-20,-.25,-32,-16.0614,-.25,7.885],
// 3 16 -16.0614 -.25 7.885 -20 -.25 -32 -15.6483 -.25 5.8069
  [3,16,-16.0614,-.25,7.885,-20,-.25,-32,-15.6483,-.25,5.8069],
// 3 16 -15.6483 -.25 5.8069 -20 -.25 -32 -14.967 -.25 3.8008
  [3,16,-15.6483,-.25,5.8069,-20,-.25,-32,-14.967,-.25,3.8008],
// 3 16 -14.967 -.25 3.8008 -20 -.25 -32 -14.0292 -.25 1.9
  [3,16,-14.967,-.25,3.8008,-20,-.25,-32,-14.0292,-.25,1.9],
// 3 16 -14.0292 -.25 1.9 -20 -.25 -32 -12.852 -.25 .1378
  [3,16,-14.0292,-.25,1.9,-20,-.25,-32,-12.852,-.25,.1378],
// 3 16 -12.852 -.25 .1378 -20 -.25 -32 -11.4552 -.25 -1.4552
  [3,16,-12.852,-.25,.1378,-20,-.25,-32,-11.4552,-.25,-1.4552],
// 3 16 -11.4552 -.25 -1.4552 -20 -.25 -32 -9.8622 -.25 -2.852
  [3,16,-11.4552,-.25,-1.4552,-20,-.25,-32,-9.8622,-.25,-2.852],
// 3 16 -9.8622 -.25 -2.852 -20 -.25 -32 -8.1 -.25 -4.0301
  [3,16,-9.8622,-.25,-2.852,-20,-.25,-32,-8.1,-.25,-4.0301],
// 3 16 -8.1 -.25 -4.0301 -20 -.25 -32 -6.1992 -.25 -4.967
  [3,16,-8.1,-.25,-4.0301,-20,-.25,-32,-6.1992,-.25,-4.967],
// 3 16 -3 -.25 -11 -20 -.25 -32 -3 -.25 -14
  [3,16,-3,-.25,-11,-20,-.25,-32,-3,-.25,-14],
// 3 16 6.1992 -.25 -4.967 4.1931 -.25 -5.6483 20 -.25 -32
  [3,16,6.1992,-.25,-4.967,4.1931,-.25,-5.6483,20,-.25,-32],
// 3 16 8.1 -.25 -4.0301 6.1992 -.25 -4.967 20 -.25 -32
  [3,16,8.1,-.25,-4.0301,6.1992,-.25,-4.967,20,-.25,-32],
// 3 16 9.8622 -.25 -2.852 8.1 -.25 -4.0301 20 -.25 -32
  [3,16,9.8622,-.25,-2.852,8.1,-.25,-4.0301,20,-.25,-32],
// 3 16 11.4552 -.25 -1.4552 9.8622 -.25 -2.852 20 -.25 -32
  [3,16,11.4552,-.25,-1.4552,9.8622,-.25,-2.852,20,-.25,-32],
// 3 16 12.852 -.25 .1378 11.4552 -.25 -1.4552 20 -.25 -32
  [3,16,12.852,-.25,.1378,11.4552,-.25,-1.4552,20,-.25,-32],
// 3 16 14.0292 -.25 1.9 12.852 -.25 .1378 20 -.25 -32
  [3,16,14.0292,-.25,1.9,12.852,-.25,.1378,20,-.25,-32],
// 3 16 14.967 -.25 3.8008 14.0292 -.25 1.9 20 -.25 -32
  [3,16,14.967,-.25,3.8008,14.0292,-.25,1.9,20,-.25,-32],
// 3 16 16.2 -.25 10 16.0614 -.25 7.885 20 -.25 -32
  [3,16,16.2,-.25,10,16.0614,-.25,7.885,20,-.25,-32],
// 3 16 16.0614 -.25 7.885 15.6483 -.25 5.8069 20 -.25 -32
  [3,16,16.0614,-.25,7.885,15.6483,-.25,5.8069,20,-.25,-32],
// 3 16 15.6483 -.25 5.8069 14.967 -.25 3.8008 20 -.25 -32
  [3,16,15.6483,-.25,5.8069,14.967,-.25,3.8008,20,-.25,-32],
// 3 16 2.1141 -.25 -6.0614 0 -.25 -6.2 3 -.25 -11
  [3,16,2.1141,-.25,-6.0614,0,-.25,-6.2,3,-.25,-11],
// 3 16 4.1931 -.25 -5.6483 2.1141 -.25 -6.0614 3 -.25 -11
  [3,16,4.1931,-.25,-5.6483,2.1141,-.25,-6.0614,3,-.25,-11],
// 3 16 -4.1931 -.25 -5.6483 -3 -.25 -11 -2.1141 -.25 -6.0614
  [3,16,-4.1931,-.25,-5.6483,-3,-.25,-11,-2.1141,-.25,-6.0614],
// 4 16 0 -.25 -14 -3 -.25 -14 -20 -.25 -32 0 -.25 -30
  [4,16,0,-.25,-14,-3,-.25,-14,-20,-.25,-32,0,-.25,-30],
// 4 16 -20 -.25 -32 20 -.25 -32 3 -.25 -30 0 -.25 -30
  [4,16,-20,-.25,-32,20,-.25,-32,3,-.25,-30,0,-.25,-30],
// 4 16 0 -.25 26.2 2.1141 -.25 26.0614 7.7787 -.25 29.0314 -20 -.25 32
  [4,16,0,-.25,26.2,2.1141,-.25,26.0614,7.7787,-.25,29.0314,-20,-.25,32],
// 4 16 12.5928 -.25 26.2522 11.4579 -.25 21.4525 12.852 -.25 19.8622 20 -.25 32
  [4,16,12.5928,-.25,26.2522,11.4579,-.25,21.4525,12.852,-.25,19.8622,20,-.25,32],
// 4 16 16.2 -.25 10 20 -.25 -32 20 -.25 32 16.0614 -.25 12.1141
  [4,16,16.2,-.25,10,20,-.25,-32,20,-.25,32,16.0614,-.25,12.1141],
// 4 16 -20 -.25 32 -20 -.25 -32 -16.2 -.25 10 -16.0614 -.25 12.1141
  [4,16,-20,-.25,32,-20,-.25,-32,-16.2,-.25,10,-16.0614,-.25,12.1141],
// 4 16 -4.1931 -.25 -5.6483 -6.1992 -.25 -4.967 -20 -.25 -32 -3 -.25 -11
  [4,16,-4.1931,-.25,-5.6483,-6.1992,-.25,-4.967,-20,-.25,-32,-3,-.25,-11],
// 4 16 3 -.25 -11 3 -.25 -30 20 -.25 -32 4.1931 -.25 -5.6483
  [4,16,3,-.25,-11,3,-.25,-30,20,-.25,-32,4.1931,-.25,-5.6483],
// 4 16 0 -.25 -6.2 -2.1141 -.25 -6.0614 -3 -.25 -11 3 -.25 -11
  [4,16,0,-.25,-6.2,-2.1141,-.25,-6.0614,-3,-.25,-11,3,-.25,-11],
];
module ldraw_lib__169665e(step=0, col=false, unit=2/5, alt=false, line=0.2, solid=!$preview)
    makepoly(ldraw_lib__169665e(), step=step, col=col, unit=unit, alt=alt, line=line, solid=solid);
ldraw_lib__169665e(line=0.2);
